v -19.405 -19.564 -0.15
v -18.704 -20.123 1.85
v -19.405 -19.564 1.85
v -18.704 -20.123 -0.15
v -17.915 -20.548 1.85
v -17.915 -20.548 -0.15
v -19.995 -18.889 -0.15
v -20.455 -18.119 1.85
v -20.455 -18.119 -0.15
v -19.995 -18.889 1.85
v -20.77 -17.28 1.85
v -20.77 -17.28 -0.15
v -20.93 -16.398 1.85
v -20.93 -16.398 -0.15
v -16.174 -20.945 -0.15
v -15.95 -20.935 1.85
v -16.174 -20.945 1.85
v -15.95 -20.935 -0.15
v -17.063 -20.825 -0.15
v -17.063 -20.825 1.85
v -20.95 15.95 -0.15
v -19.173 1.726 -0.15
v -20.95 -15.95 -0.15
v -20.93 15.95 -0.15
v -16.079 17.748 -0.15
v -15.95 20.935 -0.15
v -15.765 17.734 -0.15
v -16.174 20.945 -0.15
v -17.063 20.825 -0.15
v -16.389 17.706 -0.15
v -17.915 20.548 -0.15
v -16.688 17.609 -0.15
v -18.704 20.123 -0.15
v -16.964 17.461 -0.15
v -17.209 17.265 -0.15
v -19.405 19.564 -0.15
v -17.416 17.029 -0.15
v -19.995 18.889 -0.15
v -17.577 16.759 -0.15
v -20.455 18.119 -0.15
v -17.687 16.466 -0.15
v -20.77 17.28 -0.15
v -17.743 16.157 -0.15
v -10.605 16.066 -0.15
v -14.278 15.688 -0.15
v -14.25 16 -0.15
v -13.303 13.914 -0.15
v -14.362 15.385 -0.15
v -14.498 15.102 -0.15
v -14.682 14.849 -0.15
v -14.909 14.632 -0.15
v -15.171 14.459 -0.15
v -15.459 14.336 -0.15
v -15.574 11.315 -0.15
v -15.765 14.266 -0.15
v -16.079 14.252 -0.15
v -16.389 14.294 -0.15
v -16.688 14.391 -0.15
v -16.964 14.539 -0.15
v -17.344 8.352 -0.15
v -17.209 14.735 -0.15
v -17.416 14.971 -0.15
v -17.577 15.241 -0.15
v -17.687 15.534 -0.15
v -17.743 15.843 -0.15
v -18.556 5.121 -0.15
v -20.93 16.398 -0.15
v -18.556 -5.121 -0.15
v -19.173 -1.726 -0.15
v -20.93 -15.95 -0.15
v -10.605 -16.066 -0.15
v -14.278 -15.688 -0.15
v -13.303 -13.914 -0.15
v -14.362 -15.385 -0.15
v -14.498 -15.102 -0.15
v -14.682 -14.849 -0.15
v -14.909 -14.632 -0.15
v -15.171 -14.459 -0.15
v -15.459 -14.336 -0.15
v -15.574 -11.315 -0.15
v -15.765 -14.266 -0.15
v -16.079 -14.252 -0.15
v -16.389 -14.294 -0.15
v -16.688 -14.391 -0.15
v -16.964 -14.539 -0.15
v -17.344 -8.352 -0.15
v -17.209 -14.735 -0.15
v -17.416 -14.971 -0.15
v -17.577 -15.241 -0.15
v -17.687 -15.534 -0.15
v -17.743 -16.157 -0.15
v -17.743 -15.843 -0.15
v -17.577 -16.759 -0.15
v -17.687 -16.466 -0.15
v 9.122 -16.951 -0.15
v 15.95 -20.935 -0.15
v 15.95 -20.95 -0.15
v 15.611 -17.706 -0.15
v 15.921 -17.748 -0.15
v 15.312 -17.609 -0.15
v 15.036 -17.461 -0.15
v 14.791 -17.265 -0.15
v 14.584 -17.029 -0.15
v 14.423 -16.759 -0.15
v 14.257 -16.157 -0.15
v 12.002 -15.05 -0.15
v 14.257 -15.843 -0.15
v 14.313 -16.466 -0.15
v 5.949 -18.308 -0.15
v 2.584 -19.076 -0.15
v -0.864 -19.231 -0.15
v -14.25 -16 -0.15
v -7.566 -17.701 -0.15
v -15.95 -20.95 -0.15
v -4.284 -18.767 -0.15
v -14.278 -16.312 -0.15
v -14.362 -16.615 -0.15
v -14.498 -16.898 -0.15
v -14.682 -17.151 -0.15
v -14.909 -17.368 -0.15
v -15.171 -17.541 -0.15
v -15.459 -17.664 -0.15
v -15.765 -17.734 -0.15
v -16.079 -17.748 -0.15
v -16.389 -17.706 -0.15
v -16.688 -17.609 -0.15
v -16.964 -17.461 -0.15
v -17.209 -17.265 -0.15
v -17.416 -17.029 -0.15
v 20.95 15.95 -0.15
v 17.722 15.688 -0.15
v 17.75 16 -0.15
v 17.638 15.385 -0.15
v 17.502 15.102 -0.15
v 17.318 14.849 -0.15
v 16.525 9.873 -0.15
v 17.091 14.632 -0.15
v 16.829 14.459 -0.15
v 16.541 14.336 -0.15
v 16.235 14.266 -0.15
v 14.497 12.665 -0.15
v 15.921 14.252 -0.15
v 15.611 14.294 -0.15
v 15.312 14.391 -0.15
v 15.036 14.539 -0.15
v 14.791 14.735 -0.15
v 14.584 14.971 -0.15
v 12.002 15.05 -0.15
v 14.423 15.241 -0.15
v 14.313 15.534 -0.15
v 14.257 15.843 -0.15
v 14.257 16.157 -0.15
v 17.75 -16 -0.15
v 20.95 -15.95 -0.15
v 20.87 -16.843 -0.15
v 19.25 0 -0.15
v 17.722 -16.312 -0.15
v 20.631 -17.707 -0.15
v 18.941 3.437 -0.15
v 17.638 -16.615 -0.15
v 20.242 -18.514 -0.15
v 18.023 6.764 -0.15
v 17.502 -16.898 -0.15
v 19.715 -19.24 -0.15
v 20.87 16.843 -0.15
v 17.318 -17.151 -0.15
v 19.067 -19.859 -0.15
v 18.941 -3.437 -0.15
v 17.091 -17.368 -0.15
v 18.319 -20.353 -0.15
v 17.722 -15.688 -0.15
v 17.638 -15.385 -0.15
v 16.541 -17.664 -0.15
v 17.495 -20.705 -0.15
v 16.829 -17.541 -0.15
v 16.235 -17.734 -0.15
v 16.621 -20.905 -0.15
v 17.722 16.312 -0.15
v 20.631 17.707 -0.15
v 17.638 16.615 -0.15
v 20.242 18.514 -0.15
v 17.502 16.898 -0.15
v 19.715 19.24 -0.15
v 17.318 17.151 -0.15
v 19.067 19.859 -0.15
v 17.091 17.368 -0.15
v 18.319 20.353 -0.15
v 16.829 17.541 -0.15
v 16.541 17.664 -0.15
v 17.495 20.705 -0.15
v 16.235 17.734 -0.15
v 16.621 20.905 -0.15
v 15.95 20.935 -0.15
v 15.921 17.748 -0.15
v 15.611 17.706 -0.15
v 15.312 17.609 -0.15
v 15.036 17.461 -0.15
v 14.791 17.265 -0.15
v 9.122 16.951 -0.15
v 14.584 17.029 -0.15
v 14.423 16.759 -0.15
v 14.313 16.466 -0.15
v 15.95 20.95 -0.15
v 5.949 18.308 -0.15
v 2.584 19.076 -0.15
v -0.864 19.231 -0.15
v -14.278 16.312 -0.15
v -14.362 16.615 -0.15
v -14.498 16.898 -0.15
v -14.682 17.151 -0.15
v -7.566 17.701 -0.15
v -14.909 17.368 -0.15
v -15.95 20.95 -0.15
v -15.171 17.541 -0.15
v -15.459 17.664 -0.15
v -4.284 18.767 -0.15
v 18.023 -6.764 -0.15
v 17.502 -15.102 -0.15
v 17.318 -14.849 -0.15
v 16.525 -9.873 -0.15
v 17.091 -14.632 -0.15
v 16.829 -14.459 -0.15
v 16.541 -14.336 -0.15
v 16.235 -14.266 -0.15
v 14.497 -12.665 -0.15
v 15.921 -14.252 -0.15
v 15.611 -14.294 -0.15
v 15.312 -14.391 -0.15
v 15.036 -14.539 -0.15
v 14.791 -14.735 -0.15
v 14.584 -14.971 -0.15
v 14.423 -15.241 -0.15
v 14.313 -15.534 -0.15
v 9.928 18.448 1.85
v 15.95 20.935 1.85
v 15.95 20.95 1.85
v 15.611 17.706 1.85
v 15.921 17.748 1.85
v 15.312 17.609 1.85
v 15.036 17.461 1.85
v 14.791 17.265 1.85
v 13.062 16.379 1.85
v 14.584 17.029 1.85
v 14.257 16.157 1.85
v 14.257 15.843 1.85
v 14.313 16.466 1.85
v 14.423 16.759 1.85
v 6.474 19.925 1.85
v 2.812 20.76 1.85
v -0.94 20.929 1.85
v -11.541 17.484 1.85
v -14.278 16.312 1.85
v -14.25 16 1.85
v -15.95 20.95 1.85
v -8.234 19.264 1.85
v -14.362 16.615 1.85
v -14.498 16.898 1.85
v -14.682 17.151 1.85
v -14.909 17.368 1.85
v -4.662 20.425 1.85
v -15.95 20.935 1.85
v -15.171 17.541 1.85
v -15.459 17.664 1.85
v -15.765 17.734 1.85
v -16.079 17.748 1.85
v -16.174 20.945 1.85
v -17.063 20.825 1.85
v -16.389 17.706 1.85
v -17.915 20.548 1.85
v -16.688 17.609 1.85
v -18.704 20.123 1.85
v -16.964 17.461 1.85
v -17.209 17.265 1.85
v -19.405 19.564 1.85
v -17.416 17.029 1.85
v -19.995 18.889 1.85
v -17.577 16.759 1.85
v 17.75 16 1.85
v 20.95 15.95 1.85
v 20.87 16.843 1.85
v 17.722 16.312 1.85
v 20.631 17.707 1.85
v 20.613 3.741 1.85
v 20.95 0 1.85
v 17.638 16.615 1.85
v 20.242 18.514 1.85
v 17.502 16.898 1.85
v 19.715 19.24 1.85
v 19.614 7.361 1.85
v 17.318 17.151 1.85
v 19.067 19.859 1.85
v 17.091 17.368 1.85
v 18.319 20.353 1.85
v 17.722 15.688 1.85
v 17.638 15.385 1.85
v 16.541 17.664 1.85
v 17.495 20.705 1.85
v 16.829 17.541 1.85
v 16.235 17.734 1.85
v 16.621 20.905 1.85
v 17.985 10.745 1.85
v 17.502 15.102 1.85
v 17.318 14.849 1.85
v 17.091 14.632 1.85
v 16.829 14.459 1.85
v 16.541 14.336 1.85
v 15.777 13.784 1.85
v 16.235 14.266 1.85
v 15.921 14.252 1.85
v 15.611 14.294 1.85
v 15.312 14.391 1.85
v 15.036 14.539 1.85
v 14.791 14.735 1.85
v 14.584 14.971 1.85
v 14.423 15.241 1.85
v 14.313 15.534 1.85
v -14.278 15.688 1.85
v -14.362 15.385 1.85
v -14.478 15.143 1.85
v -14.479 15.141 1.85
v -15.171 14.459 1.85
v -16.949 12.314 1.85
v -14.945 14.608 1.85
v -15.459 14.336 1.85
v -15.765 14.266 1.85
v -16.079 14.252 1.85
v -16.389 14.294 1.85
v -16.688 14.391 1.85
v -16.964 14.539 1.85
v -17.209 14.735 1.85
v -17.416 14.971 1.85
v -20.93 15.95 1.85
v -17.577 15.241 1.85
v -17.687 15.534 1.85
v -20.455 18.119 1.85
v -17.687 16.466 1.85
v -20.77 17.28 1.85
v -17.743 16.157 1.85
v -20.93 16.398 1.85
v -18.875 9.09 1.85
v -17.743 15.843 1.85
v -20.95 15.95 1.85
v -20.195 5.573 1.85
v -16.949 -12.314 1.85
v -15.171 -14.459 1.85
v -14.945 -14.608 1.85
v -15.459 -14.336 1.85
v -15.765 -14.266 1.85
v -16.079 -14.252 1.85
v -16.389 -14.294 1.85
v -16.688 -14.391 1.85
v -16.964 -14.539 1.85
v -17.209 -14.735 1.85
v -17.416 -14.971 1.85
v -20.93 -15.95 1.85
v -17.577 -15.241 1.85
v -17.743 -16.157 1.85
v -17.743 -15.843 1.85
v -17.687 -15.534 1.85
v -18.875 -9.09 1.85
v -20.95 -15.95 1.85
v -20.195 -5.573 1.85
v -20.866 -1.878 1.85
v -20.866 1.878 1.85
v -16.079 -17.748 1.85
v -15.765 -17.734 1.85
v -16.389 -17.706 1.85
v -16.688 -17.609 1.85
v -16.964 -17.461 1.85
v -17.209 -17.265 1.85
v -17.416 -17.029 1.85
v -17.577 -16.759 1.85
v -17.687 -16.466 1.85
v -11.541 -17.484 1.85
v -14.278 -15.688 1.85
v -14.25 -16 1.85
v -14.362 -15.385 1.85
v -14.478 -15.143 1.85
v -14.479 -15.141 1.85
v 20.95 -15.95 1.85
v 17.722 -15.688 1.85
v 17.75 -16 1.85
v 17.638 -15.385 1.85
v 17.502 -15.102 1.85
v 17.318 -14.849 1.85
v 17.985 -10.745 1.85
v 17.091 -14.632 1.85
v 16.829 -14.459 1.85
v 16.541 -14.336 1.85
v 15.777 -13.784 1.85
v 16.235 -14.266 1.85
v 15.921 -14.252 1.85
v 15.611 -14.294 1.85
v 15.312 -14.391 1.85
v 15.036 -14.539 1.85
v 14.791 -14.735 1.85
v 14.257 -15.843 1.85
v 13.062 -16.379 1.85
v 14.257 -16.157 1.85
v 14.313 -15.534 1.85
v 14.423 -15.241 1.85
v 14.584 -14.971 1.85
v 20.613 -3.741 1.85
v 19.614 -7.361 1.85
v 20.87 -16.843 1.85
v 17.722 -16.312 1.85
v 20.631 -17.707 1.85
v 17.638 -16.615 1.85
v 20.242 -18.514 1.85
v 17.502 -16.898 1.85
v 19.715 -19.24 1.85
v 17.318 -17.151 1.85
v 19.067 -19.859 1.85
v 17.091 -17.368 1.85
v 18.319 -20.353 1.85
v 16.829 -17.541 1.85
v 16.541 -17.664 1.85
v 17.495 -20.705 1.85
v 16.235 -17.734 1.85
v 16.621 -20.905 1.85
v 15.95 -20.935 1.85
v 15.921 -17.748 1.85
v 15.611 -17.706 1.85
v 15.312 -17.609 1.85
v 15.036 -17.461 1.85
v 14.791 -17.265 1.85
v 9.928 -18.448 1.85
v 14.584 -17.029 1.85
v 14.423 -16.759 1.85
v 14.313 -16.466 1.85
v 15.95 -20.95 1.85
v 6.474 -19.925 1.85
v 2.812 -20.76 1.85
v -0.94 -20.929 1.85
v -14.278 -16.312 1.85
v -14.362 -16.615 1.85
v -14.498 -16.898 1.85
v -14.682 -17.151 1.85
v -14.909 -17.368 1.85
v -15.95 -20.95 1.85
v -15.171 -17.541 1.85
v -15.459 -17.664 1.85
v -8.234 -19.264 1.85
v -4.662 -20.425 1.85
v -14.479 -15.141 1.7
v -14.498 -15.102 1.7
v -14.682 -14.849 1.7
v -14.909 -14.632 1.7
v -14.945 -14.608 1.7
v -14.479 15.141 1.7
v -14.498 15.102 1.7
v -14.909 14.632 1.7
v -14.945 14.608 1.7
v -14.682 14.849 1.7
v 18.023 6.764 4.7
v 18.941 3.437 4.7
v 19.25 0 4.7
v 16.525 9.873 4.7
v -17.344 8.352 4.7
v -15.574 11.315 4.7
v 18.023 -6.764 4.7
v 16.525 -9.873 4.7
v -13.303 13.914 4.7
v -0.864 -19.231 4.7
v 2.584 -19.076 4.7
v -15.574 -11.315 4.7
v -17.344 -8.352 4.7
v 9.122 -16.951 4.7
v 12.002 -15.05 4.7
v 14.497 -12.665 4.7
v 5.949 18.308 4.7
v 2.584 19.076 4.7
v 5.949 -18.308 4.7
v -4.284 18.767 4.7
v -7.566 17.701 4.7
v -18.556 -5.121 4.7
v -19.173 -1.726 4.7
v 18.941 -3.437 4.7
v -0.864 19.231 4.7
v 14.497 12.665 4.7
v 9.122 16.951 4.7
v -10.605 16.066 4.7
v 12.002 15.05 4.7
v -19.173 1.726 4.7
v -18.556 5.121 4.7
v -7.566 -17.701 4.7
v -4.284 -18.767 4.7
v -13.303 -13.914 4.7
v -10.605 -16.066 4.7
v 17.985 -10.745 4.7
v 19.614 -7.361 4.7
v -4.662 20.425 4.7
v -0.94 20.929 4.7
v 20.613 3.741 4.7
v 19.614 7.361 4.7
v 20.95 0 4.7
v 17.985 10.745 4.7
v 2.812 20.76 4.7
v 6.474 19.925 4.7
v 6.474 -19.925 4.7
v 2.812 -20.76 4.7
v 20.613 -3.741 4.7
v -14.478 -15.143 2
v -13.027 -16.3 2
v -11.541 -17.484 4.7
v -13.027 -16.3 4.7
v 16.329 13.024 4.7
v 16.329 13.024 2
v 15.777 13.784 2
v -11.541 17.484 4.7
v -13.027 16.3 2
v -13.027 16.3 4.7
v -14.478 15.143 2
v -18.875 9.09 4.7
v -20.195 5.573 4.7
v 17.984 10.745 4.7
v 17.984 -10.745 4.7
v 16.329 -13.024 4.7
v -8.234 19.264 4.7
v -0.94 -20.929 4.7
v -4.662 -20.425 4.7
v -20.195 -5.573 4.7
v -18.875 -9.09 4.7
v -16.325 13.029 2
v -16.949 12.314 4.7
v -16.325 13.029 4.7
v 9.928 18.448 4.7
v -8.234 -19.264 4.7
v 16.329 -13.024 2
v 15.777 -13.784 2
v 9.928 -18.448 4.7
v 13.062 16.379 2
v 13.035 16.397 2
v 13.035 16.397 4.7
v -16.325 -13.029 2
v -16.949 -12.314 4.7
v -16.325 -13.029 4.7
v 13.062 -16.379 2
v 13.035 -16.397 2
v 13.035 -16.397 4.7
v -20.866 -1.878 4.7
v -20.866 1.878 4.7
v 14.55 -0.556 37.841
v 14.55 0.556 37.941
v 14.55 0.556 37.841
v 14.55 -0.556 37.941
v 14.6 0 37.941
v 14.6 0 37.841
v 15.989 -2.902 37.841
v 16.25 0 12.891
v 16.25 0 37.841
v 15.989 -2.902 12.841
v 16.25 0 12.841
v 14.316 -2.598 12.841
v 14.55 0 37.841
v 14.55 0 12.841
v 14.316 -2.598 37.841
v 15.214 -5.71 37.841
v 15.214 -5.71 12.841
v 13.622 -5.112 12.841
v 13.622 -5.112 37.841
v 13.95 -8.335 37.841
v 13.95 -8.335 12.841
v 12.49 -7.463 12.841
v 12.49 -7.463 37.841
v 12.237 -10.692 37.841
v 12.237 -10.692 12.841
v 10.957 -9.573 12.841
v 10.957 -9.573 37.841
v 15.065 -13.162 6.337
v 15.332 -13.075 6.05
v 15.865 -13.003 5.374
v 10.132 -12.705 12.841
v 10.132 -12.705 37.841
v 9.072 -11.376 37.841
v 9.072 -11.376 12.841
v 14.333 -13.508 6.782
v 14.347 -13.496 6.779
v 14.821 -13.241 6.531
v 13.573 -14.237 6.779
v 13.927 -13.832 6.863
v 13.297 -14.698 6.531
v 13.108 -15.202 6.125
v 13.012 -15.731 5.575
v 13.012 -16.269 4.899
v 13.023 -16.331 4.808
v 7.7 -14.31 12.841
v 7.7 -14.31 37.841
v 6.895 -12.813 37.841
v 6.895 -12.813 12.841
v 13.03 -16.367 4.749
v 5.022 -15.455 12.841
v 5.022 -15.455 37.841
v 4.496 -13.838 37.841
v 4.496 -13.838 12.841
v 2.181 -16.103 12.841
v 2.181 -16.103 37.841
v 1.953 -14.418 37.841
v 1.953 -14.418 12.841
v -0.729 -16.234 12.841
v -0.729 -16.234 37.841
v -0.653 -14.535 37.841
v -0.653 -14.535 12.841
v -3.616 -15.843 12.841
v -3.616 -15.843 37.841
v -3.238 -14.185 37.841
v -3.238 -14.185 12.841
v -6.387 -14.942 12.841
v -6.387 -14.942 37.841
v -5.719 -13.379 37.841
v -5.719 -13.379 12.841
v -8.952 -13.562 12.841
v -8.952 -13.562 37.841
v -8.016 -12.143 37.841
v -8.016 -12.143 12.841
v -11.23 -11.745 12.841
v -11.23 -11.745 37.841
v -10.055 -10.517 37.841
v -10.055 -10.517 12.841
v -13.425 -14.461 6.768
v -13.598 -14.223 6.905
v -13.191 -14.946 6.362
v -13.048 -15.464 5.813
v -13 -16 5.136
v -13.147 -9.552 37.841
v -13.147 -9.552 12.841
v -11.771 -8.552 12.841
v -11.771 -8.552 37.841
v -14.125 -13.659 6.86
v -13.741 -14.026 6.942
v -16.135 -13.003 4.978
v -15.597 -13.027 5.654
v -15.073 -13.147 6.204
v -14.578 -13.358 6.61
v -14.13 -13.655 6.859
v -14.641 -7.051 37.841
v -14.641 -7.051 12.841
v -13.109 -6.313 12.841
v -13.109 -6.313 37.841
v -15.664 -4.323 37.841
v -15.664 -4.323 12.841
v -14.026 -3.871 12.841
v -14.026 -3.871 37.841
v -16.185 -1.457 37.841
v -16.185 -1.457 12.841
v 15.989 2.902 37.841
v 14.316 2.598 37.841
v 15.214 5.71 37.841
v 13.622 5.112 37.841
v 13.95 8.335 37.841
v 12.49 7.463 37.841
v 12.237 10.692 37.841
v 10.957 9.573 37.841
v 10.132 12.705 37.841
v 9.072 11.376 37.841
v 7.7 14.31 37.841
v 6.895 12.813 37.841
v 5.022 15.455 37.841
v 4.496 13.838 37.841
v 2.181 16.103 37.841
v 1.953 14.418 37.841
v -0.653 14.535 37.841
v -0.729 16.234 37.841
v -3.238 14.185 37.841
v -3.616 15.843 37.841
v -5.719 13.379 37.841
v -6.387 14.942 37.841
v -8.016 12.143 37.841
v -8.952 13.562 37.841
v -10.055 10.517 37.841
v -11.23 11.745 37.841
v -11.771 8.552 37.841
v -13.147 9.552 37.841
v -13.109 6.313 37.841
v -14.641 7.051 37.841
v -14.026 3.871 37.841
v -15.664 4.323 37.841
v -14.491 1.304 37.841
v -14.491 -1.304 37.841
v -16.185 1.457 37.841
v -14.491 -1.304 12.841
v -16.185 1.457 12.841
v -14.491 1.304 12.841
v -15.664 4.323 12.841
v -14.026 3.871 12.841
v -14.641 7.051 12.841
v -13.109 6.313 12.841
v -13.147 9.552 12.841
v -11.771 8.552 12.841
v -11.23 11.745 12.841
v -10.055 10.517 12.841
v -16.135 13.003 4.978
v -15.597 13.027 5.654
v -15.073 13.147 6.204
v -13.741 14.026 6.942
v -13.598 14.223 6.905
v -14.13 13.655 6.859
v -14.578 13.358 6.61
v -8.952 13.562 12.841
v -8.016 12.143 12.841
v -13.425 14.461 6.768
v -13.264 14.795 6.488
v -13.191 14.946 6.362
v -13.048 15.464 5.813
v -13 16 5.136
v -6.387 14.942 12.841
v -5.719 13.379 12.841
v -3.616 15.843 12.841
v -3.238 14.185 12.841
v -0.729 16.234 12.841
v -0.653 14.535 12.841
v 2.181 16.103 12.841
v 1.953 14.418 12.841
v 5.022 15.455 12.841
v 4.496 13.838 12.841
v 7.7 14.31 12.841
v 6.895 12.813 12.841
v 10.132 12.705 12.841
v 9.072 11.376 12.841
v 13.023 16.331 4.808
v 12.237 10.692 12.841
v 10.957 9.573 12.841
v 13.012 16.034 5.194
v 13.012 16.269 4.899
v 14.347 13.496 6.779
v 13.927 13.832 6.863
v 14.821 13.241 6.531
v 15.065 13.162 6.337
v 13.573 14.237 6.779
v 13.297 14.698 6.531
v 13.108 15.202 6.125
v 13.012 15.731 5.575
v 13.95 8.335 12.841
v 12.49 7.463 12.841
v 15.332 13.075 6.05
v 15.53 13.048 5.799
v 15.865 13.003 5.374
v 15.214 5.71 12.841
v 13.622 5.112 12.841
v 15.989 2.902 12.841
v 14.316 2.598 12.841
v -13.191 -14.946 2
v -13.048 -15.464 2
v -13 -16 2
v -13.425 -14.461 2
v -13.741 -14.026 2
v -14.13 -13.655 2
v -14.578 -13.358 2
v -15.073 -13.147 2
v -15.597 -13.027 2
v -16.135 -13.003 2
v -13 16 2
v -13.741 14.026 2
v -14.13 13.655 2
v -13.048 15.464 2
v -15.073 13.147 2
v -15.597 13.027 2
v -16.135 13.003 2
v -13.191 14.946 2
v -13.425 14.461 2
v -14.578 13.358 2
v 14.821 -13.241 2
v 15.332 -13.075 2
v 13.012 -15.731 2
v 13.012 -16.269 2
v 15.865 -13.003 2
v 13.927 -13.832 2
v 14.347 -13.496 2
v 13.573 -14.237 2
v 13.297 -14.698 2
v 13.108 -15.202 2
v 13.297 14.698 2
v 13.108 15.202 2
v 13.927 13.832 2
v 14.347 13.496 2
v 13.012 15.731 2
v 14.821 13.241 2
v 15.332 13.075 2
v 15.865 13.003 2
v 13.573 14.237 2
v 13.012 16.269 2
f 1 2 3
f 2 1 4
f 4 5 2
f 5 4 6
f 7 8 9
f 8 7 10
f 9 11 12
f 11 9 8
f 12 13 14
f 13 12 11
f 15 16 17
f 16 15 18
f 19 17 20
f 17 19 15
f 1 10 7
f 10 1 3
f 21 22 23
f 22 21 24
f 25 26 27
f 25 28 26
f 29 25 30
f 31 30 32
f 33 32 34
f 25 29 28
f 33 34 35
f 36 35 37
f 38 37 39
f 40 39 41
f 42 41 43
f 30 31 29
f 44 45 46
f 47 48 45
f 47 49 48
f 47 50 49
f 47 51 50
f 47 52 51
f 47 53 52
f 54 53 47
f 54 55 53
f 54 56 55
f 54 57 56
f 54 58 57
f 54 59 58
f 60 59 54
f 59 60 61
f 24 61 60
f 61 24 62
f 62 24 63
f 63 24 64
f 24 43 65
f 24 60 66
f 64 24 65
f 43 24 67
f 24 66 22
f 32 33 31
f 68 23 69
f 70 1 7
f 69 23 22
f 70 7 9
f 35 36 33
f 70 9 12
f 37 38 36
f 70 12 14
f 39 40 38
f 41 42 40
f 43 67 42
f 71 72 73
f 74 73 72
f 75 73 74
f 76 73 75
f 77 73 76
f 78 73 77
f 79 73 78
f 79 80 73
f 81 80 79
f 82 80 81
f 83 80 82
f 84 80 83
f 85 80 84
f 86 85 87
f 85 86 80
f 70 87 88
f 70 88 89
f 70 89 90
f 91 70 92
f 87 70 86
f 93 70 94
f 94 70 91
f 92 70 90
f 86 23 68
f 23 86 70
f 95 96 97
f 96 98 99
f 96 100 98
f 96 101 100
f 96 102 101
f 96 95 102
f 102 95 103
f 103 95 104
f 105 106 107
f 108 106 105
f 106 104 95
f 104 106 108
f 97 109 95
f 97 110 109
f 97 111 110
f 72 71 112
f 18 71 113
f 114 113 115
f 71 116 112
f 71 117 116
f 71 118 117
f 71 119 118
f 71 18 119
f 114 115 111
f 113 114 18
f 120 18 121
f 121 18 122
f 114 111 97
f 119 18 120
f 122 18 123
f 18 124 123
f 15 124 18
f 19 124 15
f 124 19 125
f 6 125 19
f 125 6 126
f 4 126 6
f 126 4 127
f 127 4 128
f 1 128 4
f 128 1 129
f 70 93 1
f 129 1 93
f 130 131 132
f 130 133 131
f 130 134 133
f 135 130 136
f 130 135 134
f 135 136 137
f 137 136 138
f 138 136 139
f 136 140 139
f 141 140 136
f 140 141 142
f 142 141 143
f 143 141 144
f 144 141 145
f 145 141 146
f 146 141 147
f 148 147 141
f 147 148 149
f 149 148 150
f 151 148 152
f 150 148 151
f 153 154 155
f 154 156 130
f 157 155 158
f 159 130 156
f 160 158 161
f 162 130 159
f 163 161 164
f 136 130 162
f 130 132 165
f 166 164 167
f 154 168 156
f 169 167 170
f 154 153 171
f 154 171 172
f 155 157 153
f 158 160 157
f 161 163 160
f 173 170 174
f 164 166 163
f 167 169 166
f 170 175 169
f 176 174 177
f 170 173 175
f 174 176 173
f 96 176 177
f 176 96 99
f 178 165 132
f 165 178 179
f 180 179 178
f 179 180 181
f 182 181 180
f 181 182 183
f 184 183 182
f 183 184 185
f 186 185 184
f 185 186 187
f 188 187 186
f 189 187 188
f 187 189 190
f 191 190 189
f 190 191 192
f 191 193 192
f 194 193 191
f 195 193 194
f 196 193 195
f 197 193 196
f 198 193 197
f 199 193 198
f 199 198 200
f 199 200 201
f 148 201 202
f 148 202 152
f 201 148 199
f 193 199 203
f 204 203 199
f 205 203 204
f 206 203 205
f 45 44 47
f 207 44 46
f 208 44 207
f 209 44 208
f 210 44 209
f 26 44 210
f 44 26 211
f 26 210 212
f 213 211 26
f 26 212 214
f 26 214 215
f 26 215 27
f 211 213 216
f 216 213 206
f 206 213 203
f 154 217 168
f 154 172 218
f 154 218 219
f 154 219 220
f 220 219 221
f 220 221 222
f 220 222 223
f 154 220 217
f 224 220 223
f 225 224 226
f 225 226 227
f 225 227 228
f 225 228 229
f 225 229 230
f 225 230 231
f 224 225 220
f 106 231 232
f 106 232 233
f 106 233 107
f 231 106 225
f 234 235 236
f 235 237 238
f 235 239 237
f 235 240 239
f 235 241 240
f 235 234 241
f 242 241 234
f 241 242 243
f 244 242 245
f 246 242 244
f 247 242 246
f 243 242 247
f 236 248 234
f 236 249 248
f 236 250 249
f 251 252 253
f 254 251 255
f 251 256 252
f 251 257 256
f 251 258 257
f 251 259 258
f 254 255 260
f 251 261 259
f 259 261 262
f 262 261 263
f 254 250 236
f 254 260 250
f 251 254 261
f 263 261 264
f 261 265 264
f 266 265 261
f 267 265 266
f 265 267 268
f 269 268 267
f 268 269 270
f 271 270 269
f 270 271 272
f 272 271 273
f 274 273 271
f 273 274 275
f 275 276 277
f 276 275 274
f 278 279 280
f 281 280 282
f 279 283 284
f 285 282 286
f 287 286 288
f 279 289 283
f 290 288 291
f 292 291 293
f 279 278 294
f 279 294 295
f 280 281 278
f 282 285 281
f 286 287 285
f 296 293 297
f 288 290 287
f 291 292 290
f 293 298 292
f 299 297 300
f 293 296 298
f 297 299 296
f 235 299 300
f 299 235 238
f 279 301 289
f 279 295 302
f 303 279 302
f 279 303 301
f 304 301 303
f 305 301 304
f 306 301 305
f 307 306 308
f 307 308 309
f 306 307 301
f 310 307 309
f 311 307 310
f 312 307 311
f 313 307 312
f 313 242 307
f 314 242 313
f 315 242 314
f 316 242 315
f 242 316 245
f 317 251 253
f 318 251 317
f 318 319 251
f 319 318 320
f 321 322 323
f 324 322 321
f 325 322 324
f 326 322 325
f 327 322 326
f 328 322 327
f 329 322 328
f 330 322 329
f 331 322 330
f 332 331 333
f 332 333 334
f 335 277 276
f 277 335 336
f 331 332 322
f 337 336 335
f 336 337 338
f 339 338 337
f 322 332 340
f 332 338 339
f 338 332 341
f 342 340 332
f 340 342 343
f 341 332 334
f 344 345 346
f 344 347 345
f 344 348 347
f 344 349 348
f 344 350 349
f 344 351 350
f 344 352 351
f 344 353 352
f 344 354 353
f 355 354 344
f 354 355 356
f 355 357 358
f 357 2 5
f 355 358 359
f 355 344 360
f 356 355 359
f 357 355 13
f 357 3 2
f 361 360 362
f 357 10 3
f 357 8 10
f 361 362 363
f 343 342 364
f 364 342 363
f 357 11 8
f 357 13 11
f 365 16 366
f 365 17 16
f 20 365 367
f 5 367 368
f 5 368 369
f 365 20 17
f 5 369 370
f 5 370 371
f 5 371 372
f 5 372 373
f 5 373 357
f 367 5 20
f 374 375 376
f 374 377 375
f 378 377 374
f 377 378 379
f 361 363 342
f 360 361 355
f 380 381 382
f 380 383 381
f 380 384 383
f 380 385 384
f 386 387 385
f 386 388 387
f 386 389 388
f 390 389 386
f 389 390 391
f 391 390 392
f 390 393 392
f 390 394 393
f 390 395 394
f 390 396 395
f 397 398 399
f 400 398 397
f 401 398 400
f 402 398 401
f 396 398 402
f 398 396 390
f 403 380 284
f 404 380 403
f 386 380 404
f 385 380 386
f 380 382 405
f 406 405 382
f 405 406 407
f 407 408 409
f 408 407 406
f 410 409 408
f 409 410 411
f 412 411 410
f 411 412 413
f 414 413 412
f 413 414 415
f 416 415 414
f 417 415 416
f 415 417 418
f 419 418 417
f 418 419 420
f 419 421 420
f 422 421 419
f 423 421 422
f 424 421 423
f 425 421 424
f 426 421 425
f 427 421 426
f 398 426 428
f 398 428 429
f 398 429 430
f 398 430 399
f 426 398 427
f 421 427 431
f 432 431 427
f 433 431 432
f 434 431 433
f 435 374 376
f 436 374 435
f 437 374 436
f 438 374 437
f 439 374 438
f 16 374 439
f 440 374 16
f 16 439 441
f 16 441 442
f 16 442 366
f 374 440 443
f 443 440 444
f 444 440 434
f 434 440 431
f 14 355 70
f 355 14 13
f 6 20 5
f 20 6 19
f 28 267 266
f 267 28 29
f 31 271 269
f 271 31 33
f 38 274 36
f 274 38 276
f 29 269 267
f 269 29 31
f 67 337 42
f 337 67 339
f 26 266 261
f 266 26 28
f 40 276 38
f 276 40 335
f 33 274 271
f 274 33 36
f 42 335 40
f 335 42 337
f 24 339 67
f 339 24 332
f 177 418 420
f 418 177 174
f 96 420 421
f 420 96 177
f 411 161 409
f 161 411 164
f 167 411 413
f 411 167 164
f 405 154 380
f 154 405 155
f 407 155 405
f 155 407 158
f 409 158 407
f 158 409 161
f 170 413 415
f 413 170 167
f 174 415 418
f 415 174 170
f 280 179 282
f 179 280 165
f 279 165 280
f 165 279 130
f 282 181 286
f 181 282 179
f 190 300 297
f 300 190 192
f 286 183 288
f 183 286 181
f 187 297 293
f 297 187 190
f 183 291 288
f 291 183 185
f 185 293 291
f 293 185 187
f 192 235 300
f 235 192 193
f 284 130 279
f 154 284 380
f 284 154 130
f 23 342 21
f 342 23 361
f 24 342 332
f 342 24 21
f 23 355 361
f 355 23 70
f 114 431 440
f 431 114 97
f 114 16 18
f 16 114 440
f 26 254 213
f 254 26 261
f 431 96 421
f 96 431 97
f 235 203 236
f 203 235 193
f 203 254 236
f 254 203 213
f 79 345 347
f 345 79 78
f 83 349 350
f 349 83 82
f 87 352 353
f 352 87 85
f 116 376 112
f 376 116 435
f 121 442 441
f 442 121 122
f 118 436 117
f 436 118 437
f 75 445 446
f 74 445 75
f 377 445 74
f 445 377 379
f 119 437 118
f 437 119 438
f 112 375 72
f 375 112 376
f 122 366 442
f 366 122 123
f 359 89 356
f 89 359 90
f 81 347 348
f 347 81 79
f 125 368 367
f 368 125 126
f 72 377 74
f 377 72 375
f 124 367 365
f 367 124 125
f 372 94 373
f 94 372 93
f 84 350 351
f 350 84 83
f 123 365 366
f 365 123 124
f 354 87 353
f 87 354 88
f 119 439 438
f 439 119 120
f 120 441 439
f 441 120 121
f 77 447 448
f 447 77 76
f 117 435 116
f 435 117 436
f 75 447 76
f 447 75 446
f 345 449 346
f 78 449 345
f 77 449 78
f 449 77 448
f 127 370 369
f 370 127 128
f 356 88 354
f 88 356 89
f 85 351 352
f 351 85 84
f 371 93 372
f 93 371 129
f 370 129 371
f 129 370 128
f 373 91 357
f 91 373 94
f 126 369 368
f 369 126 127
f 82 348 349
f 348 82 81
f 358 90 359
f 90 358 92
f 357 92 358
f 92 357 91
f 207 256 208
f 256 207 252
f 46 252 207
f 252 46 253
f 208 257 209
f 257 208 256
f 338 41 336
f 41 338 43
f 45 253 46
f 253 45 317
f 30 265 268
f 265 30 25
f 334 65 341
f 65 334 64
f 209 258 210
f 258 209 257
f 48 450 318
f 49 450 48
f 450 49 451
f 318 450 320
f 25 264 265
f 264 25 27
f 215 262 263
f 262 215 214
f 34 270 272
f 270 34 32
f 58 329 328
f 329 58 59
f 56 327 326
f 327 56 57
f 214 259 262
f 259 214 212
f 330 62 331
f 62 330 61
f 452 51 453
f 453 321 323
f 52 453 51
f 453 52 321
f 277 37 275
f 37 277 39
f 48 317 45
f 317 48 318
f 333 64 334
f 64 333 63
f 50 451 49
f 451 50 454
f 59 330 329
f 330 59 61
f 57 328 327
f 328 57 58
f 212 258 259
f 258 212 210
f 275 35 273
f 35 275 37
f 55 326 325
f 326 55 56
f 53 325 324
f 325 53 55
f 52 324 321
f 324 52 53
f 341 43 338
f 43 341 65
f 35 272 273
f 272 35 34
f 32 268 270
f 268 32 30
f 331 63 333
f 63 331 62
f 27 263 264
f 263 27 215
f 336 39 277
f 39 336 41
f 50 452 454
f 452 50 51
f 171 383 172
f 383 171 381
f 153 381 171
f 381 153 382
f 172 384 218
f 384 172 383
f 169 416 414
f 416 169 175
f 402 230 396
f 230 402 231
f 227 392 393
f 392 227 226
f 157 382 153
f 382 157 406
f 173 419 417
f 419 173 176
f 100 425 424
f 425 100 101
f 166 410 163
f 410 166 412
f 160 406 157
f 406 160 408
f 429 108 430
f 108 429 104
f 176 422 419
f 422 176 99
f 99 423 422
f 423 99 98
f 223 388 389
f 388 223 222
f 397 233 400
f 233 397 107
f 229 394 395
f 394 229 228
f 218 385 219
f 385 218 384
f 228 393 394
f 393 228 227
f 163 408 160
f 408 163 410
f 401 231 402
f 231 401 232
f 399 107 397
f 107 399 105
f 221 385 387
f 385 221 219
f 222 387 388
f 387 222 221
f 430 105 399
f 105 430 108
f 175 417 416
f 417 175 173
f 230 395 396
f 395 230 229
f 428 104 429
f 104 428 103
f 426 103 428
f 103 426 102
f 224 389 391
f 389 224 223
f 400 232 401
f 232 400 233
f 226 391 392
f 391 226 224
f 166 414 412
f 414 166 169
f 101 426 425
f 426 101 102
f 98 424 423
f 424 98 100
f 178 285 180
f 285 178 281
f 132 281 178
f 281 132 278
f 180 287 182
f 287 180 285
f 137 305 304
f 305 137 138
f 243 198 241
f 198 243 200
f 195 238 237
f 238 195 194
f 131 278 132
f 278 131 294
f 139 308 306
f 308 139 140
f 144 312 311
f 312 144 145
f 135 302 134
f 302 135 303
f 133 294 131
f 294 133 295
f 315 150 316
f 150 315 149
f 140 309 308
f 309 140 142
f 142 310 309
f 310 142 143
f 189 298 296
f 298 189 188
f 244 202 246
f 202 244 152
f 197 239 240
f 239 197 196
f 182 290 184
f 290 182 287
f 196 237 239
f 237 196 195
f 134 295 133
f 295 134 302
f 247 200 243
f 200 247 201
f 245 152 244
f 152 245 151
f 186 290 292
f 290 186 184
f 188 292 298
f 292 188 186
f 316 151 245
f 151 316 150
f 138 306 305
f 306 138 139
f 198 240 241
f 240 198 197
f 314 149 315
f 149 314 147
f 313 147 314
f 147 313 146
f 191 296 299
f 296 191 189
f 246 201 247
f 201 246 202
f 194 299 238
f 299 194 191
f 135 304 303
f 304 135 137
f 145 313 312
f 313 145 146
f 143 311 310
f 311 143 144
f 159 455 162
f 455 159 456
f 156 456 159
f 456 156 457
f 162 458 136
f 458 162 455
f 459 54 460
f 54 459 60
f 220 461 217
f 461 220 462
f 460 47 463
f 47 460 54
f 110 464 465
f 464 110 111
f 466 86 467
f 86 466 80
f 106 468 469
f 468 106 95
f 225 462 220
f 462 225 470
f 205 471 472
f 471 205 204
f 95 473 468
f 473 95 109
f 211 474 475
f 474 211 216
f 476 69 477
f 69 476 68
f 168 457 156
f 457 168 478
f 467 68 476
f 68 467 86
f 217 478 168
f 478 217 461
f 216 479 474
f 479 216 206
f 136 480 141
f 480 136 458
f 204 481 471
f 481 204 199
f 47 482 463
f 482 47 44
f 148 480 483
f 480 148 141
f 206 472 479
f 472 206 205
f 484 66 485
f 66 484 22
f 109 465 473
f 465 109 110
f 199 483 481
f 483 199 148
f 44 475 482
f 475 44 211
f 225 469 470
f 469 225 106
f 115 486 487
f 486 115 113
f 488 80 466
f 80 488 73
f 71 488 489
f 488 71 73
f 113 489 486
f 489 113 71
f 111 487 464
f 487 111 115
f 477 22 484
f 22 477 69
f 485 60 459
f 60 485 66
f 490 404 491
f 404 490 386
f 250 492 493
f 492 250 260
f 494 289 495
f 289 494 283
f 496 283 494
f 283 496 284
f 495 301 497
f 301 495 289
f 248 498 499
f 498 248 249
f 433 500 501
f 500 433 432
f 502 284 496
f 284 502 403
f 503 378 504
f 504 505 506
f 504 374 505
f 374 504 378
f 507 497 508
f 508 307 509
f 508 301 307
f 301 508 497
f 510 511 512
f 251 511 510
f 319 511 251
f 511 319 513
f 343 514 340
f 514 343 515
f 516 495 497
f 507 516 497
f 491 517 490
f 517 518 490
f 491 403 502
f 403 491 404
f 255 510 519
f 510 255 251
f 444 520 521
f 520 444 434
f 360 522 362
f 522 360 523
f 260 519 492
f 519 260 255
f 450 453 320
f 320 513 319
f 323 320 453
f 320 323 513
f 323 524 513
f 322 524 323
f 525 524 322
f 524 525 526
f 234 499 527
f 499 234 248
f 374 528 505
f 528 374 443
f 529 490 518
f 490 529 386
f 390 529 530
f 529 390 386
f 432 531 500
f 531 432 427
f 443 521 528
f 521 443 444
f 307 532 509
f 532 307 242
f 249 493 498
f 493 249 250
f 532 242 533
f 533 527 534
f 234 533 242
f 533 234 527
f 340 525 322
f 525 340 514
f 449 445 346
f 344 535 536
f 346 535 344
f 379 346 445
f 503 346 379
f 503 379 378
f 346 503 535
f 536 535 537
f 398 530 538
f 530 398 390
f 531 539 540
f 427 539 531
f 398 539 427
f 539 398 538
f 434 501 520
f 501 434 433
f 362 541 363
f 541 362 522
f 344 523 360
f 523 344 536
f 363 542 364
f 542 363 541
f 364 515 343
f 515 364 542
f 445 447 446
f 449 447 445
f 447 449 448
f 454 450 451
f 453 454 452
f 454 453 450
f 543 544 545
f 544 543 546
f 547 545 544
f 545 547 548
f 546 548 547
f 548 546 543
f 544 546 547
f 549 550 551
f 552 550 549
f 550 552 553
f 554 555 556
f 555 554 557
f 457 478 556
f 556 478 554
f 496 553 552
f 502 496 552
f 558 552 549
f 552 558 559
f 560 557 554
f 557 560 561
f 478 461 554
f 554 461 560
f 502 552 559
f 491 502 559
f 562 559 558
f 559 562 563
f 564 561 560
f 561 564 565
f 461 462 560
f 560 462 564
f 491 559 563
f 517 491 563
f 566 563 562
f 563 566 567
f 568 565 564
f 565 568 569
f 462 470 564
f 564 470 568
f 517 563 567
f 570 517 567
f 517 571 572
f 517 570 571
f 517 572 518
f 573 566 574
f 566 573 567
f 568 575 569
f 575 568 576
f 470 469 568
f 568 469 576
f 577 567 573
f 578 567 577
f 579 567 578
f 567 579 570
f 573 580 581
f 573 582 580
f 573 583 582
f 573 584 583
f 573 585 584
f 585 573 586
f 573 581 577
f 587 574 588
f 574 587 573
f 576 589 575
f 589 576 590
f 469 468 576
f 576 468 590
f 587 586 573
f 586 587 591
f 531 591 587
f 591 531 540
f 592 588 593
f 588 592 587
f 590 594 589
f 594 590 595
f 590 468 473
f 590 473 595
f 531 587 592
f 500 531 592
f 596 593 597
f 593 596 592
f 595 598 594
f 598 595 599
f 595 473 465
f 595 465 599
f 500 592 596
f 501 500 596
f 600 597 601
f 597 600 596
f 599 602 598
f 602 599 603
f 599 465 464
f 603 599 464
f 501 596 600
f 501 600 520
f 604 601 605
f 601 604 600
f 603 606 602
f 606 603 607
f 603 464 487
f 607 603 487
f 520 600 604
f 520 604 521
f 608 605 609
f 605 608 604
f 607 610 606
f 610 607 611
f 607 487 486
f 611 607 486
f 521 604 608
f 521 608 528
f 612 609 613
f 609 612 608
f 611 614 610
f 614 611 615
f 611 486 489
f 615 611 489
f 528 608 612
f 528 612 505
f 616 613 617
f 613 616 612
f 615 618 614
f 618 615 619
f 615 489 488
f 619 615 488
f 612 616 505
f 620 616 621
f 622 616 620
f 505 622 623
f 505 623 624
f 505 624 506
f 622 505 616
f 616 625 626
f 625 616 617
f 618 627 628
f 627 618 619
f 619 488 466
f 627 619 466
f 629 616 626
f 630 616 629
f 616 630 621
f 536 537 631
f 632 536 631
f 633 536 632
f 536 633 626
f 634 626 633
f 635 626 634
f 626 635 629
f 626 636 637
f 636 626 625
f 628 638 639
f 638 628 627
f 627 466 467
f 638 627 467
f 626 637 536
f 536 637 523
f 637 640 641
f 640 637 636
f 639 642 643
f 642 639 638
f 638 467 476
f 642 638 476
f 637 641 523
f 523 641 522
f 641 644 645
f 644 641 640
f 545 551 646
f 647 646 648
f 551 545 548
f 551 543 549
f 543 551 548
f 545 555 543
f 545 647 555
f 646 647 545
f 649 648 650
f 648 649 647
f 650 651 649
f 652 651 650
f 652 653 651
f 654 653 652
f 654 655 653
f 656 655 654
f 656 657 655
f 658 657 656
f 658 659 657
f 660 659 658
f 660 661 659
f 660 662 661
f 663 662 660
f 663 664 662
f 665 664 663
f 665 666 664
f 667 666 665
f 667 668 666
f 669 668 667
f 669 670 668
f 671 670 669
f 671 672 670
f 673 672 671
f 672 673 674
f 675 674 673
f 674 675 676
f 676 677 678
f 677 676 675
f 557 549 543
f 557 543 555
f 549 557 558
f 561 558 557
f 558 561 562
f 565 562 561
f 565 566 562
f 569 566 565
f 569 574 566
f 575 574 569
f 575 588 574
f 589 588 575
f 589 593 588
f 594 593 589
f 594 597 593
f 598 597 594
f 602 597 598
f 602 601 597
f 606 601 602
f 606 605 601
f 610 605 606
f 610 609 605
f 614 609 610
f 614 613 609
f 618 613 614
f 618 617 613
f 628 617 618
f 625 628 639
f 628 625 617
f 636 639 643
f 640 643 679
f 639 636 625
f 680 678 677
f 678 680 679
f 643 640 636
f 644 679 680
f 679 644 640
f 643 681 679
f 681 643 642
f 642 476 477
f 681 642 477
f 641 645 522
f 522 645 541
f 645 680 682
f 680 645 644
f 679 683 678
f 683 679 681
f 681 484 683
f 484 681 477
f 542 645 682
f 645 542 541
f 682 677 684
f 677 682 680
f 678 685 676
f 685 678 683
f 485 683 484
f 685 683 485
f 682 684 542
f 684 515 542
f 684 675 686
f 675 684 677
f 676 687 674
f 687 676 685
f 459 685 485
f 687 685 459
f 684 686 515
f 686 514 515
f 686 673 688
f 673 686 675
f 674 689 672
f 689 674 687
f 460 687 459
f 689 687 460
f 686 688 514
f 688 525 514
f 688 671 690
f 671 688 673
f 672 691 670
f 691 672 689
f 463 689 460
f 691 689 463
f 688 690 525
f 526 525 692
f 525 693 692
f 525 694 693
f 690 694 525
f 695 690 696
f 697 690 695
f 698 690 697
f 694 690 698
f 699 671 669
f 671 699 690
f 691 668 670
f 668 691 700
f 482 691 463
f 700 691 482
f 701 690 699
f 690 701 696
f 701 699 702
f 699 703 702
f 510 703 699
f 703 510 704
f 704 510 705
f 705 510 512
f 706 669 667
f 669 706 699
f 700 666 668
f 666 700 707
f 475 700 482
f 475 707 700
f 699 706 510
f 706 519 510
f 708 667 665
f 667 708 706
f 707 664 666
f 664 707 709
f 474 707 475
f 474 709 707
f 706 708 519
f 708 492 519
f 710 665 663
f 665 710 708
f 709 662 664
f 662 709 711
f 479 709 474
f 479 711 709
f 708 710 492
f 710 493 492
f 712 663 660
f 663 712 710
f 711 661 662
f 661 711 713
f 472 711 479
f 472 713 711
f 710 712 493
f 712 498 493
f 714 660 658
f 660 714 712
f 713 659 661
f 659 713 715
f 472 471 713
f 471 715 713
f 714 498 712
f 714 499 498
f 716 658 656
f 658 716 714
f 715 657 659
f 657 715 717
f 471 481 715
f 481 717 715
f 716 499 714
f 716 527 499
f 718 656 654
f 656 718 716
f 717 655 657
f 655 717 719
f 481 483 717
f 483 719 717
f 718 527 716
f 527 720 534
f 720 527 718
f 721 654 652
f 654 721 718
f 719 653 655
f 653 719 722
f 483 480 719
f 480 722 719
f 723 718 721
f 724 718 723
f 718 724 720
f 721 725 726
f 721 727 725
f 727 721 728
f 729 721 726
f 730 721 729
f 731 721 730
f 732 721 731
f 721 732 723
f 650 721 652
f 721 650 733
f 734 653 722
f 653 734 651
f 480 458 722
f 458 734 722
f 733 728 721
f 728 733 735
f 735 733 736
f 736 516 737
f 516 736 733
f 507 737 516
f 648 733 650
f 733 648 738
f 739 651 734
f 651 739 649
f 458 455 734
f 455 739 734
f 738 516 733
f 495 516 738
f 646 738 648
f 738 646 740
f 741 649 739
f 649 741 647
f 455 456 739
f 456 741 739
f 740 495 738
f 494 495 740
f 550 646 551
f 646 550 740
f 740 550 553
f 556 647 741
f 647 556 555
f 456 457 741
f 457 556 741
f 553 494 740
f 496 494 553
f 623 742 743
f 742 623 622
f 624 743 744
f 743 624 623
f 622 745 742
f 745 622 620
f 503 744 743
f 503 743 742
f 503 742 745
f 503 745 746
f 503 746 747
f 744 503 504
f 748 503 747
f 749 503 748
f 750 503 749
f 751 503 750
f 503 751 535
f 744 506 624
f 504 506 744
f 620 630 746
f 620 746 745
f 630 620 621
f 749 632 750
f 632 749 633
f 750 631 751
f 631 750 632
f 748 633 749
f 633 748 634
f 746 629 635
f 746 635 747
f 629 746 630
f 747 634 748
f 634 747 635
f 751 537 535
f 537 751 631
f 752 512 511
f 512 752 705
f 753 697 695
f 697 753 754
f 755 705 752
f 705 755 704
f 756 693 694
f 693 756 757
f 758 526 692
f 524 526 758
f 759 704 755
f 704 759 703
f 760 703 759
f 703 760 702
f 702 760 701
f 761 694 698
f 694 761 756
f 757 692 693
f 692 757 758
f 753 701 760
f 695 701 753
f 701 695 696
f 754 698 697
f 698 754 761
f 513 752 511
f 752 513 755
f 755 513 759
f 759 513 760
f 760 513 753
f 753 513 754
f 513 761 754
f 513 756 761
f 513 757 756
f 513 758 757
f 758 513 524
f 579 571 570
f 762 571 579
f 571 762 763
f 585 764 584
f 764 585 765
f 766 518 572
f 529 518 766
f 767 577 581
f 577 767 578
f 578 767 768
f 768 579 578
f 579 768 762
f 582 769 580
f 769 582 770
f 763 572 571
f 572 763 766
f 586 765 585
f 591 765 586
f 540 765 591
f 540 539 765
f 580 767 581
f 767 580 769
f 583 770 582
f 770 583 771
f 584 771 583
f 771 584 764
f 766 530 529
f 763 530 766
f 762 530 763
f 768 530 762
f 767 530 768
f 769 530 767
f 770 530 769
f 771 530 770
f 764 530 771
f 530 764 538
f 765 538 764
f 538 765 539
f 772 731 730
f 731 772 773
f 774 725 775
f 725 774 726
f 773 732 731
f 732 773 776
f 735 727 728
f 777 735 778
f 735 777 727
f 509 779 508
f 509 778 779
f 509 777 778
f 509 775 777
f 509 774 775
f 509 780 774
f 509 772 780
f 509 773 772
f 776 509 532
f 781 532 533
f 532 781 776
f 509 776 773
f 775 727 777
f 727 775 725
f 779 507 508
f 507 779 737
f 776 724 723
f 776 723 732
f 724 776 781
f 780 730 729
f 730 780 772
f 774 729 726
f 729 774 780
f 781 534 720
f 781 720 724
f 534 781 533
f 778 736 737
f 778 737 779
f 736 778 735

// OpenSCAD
/*
 * Tube Adapter Flange with Grating (Parametric), v1.00
 *
 * by Alex Franke (CodeCreations), Dec 2012
 * http://www.theFrankes.com
 * 
 * Licenced under Creative Commons Attribution - Non-Commercial - Share Alike 3.0 
 * 
 * DESCRIPTION: This allows you to cover a hole with a specific diameter (with optional 
 *   grating) and then attach a hose of a different diameter. For example, if you're creating
 *   an exhaust vent for a 40mm fan to push air out through a 1.25-inch tube, then you can 
 *   render this file with a 40mm input diameter and a 1.25-inch output diameter. The angle
 *   of the transition is configurable to ensure good prints. 
 * 
 * INSTRUCTIONS:  Choose some values in the "User-defined values" section, render,
 *   and print. See the comments in that section for details on how to measure. 
 * 
 * v1.00, Mar 1, 2014: Added pinch angles, flange thickness, end rounding.
 * v0.42, Dec 20, 2012: Initial Release.
 * 
 * TODO: 
 *   * None at this time
 */

/////////////////////////////////////////////////////////////////////////////
// User-defined values... 
/////////////////////////////////////////////////////////////////////////////

roundRadius       = 5;    // The radius of the rounding on the corners
thickness         = 1.7;  // The thickness of the material (tube) 
flangeThickness   = 2.0;  // The thickness of the flange
holeDistance      = 32;   // The distance on center between the mounting holes on each side  
holeDiameter      = 3.5;  // The diameter of the mounting holes 

boltHeadDiameter  = 6;    // The diameter of the bolt head (so it doesn't interfere with the tube) 

angle             = 60;   // The angle of the transition between diameters

inputTubeLength   = 3;    // The length the input diameter will extend straight before the transition.  
inputDiameter     = 38.5; // The inner diameter (ID) of the input hole
outputLength      = 25;   // The length of the output diameter after the transition. 
outputDiameter    = 29.1; // The inner diameter (ID) of the output flange. 

meshLines         = 0;    // The number of mesh lines (grates) to render (zero for none) 
meshWidth         = 0;    // The width of the mesh material (grates) 
meshHeight        = 0;    // The thickness of the mesh material (grates)

optimizeThickness = true; // true to optimize transition thickness for FDM printing (a bit thinner), 
                          //   or false for consistent thickness 

pinchAngle1       = 90;   // The angle to pinch the output tube from one side
pinchAngle2       = 90;   // ...and from the other side 
tipCutRadius      = 0;    // The radius to round in the tip
tipCutInset       = 0;    // The distance to cut into the tip 

$fn               = 35;   // general curve quality

silliness         = 0.05; // Allows OpenSCAD to create good models 


/////////////////////////////////////////////////////////////////////////////
// Some calculated values and helpful output... 
/////////////////////////////////////////////////////////////////////////////

dx = (inputDiameter - outputDiameter)/2; 
height = dx*tan(angle);
yOffset = (thickness*tan(angle/2));
xOffset = yOffset*tan(angle);
totalHeight = inputTubeLength + outputLength + height; 

echo( str( "Outer diameter of output flange is ", outputDiameter+thickness*2, " mm or ",
	(outputDiameter+thickness*2)/25.4, " in.") ); 
echo( str( "Inner diameter of output flange is ", outputDiameter, " mm or ",
	outputDiameter/25.4, " in.") ); 
echo( str( "Total height is ", totalHeight, " mm or ",
	totalHeight/25.4, " in.") ); 


/////////////////////////////////////////////////////////////////////////////
// The code...
/////////////////////////////////////////////////////////////////////////////

difference() {
	union() {
		translate([0,0,thickness/2]) 
			base(); 
		translate([0,0,inputTubeLength/2+thickness]) 
			lowerTube(); 
		translate([0,0,thickness+inputTubeLength]) 
			cone(); 
	}

	// Carve some space for the mounting bolts. 
	translate([0,0,totalHeight/2+flangeThickness+0.5]) 
	for(x=[-1,1], y=[-1,1]) {
		translate([holeDistance/2*x,holeDistance/2*y,0]) 
			cylinder(h=totalHeight+1,r=boltHeadDiameter/2, center=true);
	}
}


/////////////////////////////////////////////////////////////////////////////
// The modules...
/////////////////////////////////////////////////////////////////////////////

// Comment out the "module" line and the "}" at the end to use these settings. 
// This is likely suitable for connecting a 40mm fan to a 1.25" tube.
module example1() {
	roundRadius       = 5;
	thickness         = 1.7;
	holeDistance      = 32;
	holeDiameter      = 3.5;
	
	boltHeadDiameter  = 6;
	
	angle             = 60;
	
	inputTubeLength   = 3;
	inputDiameter     = 38.5;
	outputLength      = 15;
	outputDiameter    = (1.28*25.4)-thickness*2;
	
	meshLines         = 0;
	meshWidth         = 0;
	meshHeight        = 0;
	
	optimizeThickness = true;
}

// Comment out the "module" line and the "}" at the end to use these settings. 
// This is likely suitable for connecting a 1.25" tube to cover a 1 1/8" - 1 1/4" hole.
module example2() {
	roundRadius       = 3;
	thickness         = 1.7;
	holeDistance      = 27;
	holeDiameter      = 3.5;
	
	boltHeadDiameter  = 6;
	
	angle             = 60;
	
	inputTubeLength   = 3;
	inputDiameter     = 30;
	outputLength      = 15;
	outputDiameter    = (1.28*25.4)-thickness*2;
	
	meshLines         = 7;
	meshWidth         = 0.8;
	meshHeight        = 1;
	
	optimizeThickness = true;
}

// Comment out the "module" line and the "}" at the end to use these settings. 
// This is likely suitable for connecting a 80mm fan to a 1 1/4" tube.
module example3() {
	roundRadius       = 3;
	thickness         = 1.7;
	holeDistance      = 71.6;
	holeDiameter      = 3.5;
	
	boltHeadDiameter  = 6;
	
	angle             = 60;
	
	inputTubeLength   = 3;
	inputDiameter     = 76;
	outputLength      = 15;
	outputDiameter    = (1.28*25.4)-thickness*2;
	
	meshLines         = 0;
	meshWidth         = 0;
	meshHeight        = 0;
	
	optimizeThickness = true;
}

// Comment out the "module" line and the "}" at the end to use these settings. 
// This makes a nice 40mm fan shroud.
module example4() {
	roundRadius       = 3;
	thickness         = 0.5;
 	flangeThickness   = 1; 
	holeDistance      = 32;
	holeDiameter      = 3.5;
	
	boltHeadDiameter  = 6;
	
	angle             = 68;
	
	inputTubeLength   = 1;
	inputDiameter     = 37;
	outputLength      = 12;
	outputDiameter    = 14;
	
	meshLines         = 0;
	meshWidth         = 0;
	meshHeight        = 0;
	
	optimizeThickness = true;

	pinchAngle1       = 60; 
	pinchAngle2       = 70;
	tipCutRadius      = 12; 
	tipCutInset       = 1.5; 
}


module cone() {
	
	y = optimizeThickness ? 0 : yOffset; 

	difference() { 

		union() {
			rotate([0,0,180]) // line up the edges 
			rotate_extrude(convexity=5)
			polygon(points=[
				[inputDiameter/2+thickness,0],
				[outputDiameter/2+thickness,height],
				[outputDiameter/2+thickness,height+outputLength],
				[outputDiameter/2,height+outputLength],
				[outputDiameter/2,height-y],
				[inputDiameter/2,0-y]
			]);
		
			translate([0,0,silliness]) 
			intersection() {
				union() {
					translate([outputDiameter/2,-(outputDiameter+1)/2,height]) 
						rotate([0,-90+pinchAngle1,0]) 
							cube([thickness,outputDiameter+1,outputLength*2]); 
					translate([-outputDiameter/2-thickness,-(outputDiameter+1)/2,height]) 
						rotate([0,90-pinchAngle2,0]) 
							cube([thickness,outputDiameter+1,outputLength*2]); 
				}
				translate([0,0,height+silliness]) 
					cylinder(h=outputLength, r=outputDiameter/2+silliness); 
			}
		}

		// clean up the pinches 
		translate([outputDiameter/2+thickness,-(outputDiameter+thickness*2+1)/2,height+silliness]) 
			rotate([0,-90+pinchAngle1,0]) 
				cube([outputDiameter,outputDiameter+thickness*2+1,outputLength*2]); 
		translate([-outputDiameter/2-thickness,-(outputDiameter+thickness*2+1)/2,height+silliness]) 
			rotate([0,90-pinchAngle2,0]) 
				translate([-outputDiameter,0,0]) 
				cube([outputDiameter,outputDiameter+thickness*2+1,outputLength*2]);

		// Cut a radius into the tip
		translate([0,0,height+outputLength+tipCutRadius-tipCutInset]) 
			rotate([0,90,0])  	
				cylinder(r=tipCutRadius, h=outputDiameter+thickness*2+1, center=true); 	

	}
}

module lowerTube() {
	difference() {
		cylinder(h=inputTubeLength, r=inputDiameter/2+thickness, center=true);
		cylinder(h=inputTubeLength+1, r=inputDiameter/2, center=true);
	}
}

module base() {
	wid = max( inputDiameter + thickness*2, holeDistance + boltHeadDiameter); 
	dist = wid/2-roundRadius; 
	// meshLines = ( inputDiameter + thickness*2 - meshSize ) / ( meshWidth + meshSize );
	meshDistance = ( wid-meshWidth*meshLines ) / (meshLines+1); 


	echo( str( "Mesh hole size ", meshWidth + meshDistance, " mm" ) ); 

	union() {

		difference() {
			union() {
				for(x=[-1,1], y=[-1,1]) {
					translate([dist*x,dist*y,0]) 
						cylinder(h=flangeThickness, r=roundRadius, center=true); 
				}
				for(r=[0,90]) {
					rotate([0,0,r]) 
						cube([wid,wid-roundRadius*2,flangeThickness], 
							center=true);
				}
			}
	
			// Mounting holes 
			for(x=[-1,1], y=[-1,1]) {
				translate([holeDistance/2*x,holeDistance/2*y,0]) 
					cylinder(h=flangeThickness+1,r=holeDiameter/2, center=true);
			}
	
			// Input hole 
			cylinder(h=thickness+1,r=inputDiameter/2, center=true);
		}

		// mesh
		if ( meshLines > 0 ) {
			intersection() {
				cylinder(h=thickness+1,r=inputDiameter/2, center=true);

				translate([-wid/2,-wid/2,-thickness/2]) {
					for(x=[0:meshLines-1]) 
						translate([meshDistance+x*(meshWidth + meshDistance),0,0]) {
							cube([meshWidth,wid,meshHeight]); 
						}
		
					for(y=[0:meshLines-1]) 
						translate([0,meshDistance+y*(meshWidth + meshDistance),0]) {
							cube([wid,meshWidth,meshHeight]); 
						}
				}
			}
		}
	}
}
